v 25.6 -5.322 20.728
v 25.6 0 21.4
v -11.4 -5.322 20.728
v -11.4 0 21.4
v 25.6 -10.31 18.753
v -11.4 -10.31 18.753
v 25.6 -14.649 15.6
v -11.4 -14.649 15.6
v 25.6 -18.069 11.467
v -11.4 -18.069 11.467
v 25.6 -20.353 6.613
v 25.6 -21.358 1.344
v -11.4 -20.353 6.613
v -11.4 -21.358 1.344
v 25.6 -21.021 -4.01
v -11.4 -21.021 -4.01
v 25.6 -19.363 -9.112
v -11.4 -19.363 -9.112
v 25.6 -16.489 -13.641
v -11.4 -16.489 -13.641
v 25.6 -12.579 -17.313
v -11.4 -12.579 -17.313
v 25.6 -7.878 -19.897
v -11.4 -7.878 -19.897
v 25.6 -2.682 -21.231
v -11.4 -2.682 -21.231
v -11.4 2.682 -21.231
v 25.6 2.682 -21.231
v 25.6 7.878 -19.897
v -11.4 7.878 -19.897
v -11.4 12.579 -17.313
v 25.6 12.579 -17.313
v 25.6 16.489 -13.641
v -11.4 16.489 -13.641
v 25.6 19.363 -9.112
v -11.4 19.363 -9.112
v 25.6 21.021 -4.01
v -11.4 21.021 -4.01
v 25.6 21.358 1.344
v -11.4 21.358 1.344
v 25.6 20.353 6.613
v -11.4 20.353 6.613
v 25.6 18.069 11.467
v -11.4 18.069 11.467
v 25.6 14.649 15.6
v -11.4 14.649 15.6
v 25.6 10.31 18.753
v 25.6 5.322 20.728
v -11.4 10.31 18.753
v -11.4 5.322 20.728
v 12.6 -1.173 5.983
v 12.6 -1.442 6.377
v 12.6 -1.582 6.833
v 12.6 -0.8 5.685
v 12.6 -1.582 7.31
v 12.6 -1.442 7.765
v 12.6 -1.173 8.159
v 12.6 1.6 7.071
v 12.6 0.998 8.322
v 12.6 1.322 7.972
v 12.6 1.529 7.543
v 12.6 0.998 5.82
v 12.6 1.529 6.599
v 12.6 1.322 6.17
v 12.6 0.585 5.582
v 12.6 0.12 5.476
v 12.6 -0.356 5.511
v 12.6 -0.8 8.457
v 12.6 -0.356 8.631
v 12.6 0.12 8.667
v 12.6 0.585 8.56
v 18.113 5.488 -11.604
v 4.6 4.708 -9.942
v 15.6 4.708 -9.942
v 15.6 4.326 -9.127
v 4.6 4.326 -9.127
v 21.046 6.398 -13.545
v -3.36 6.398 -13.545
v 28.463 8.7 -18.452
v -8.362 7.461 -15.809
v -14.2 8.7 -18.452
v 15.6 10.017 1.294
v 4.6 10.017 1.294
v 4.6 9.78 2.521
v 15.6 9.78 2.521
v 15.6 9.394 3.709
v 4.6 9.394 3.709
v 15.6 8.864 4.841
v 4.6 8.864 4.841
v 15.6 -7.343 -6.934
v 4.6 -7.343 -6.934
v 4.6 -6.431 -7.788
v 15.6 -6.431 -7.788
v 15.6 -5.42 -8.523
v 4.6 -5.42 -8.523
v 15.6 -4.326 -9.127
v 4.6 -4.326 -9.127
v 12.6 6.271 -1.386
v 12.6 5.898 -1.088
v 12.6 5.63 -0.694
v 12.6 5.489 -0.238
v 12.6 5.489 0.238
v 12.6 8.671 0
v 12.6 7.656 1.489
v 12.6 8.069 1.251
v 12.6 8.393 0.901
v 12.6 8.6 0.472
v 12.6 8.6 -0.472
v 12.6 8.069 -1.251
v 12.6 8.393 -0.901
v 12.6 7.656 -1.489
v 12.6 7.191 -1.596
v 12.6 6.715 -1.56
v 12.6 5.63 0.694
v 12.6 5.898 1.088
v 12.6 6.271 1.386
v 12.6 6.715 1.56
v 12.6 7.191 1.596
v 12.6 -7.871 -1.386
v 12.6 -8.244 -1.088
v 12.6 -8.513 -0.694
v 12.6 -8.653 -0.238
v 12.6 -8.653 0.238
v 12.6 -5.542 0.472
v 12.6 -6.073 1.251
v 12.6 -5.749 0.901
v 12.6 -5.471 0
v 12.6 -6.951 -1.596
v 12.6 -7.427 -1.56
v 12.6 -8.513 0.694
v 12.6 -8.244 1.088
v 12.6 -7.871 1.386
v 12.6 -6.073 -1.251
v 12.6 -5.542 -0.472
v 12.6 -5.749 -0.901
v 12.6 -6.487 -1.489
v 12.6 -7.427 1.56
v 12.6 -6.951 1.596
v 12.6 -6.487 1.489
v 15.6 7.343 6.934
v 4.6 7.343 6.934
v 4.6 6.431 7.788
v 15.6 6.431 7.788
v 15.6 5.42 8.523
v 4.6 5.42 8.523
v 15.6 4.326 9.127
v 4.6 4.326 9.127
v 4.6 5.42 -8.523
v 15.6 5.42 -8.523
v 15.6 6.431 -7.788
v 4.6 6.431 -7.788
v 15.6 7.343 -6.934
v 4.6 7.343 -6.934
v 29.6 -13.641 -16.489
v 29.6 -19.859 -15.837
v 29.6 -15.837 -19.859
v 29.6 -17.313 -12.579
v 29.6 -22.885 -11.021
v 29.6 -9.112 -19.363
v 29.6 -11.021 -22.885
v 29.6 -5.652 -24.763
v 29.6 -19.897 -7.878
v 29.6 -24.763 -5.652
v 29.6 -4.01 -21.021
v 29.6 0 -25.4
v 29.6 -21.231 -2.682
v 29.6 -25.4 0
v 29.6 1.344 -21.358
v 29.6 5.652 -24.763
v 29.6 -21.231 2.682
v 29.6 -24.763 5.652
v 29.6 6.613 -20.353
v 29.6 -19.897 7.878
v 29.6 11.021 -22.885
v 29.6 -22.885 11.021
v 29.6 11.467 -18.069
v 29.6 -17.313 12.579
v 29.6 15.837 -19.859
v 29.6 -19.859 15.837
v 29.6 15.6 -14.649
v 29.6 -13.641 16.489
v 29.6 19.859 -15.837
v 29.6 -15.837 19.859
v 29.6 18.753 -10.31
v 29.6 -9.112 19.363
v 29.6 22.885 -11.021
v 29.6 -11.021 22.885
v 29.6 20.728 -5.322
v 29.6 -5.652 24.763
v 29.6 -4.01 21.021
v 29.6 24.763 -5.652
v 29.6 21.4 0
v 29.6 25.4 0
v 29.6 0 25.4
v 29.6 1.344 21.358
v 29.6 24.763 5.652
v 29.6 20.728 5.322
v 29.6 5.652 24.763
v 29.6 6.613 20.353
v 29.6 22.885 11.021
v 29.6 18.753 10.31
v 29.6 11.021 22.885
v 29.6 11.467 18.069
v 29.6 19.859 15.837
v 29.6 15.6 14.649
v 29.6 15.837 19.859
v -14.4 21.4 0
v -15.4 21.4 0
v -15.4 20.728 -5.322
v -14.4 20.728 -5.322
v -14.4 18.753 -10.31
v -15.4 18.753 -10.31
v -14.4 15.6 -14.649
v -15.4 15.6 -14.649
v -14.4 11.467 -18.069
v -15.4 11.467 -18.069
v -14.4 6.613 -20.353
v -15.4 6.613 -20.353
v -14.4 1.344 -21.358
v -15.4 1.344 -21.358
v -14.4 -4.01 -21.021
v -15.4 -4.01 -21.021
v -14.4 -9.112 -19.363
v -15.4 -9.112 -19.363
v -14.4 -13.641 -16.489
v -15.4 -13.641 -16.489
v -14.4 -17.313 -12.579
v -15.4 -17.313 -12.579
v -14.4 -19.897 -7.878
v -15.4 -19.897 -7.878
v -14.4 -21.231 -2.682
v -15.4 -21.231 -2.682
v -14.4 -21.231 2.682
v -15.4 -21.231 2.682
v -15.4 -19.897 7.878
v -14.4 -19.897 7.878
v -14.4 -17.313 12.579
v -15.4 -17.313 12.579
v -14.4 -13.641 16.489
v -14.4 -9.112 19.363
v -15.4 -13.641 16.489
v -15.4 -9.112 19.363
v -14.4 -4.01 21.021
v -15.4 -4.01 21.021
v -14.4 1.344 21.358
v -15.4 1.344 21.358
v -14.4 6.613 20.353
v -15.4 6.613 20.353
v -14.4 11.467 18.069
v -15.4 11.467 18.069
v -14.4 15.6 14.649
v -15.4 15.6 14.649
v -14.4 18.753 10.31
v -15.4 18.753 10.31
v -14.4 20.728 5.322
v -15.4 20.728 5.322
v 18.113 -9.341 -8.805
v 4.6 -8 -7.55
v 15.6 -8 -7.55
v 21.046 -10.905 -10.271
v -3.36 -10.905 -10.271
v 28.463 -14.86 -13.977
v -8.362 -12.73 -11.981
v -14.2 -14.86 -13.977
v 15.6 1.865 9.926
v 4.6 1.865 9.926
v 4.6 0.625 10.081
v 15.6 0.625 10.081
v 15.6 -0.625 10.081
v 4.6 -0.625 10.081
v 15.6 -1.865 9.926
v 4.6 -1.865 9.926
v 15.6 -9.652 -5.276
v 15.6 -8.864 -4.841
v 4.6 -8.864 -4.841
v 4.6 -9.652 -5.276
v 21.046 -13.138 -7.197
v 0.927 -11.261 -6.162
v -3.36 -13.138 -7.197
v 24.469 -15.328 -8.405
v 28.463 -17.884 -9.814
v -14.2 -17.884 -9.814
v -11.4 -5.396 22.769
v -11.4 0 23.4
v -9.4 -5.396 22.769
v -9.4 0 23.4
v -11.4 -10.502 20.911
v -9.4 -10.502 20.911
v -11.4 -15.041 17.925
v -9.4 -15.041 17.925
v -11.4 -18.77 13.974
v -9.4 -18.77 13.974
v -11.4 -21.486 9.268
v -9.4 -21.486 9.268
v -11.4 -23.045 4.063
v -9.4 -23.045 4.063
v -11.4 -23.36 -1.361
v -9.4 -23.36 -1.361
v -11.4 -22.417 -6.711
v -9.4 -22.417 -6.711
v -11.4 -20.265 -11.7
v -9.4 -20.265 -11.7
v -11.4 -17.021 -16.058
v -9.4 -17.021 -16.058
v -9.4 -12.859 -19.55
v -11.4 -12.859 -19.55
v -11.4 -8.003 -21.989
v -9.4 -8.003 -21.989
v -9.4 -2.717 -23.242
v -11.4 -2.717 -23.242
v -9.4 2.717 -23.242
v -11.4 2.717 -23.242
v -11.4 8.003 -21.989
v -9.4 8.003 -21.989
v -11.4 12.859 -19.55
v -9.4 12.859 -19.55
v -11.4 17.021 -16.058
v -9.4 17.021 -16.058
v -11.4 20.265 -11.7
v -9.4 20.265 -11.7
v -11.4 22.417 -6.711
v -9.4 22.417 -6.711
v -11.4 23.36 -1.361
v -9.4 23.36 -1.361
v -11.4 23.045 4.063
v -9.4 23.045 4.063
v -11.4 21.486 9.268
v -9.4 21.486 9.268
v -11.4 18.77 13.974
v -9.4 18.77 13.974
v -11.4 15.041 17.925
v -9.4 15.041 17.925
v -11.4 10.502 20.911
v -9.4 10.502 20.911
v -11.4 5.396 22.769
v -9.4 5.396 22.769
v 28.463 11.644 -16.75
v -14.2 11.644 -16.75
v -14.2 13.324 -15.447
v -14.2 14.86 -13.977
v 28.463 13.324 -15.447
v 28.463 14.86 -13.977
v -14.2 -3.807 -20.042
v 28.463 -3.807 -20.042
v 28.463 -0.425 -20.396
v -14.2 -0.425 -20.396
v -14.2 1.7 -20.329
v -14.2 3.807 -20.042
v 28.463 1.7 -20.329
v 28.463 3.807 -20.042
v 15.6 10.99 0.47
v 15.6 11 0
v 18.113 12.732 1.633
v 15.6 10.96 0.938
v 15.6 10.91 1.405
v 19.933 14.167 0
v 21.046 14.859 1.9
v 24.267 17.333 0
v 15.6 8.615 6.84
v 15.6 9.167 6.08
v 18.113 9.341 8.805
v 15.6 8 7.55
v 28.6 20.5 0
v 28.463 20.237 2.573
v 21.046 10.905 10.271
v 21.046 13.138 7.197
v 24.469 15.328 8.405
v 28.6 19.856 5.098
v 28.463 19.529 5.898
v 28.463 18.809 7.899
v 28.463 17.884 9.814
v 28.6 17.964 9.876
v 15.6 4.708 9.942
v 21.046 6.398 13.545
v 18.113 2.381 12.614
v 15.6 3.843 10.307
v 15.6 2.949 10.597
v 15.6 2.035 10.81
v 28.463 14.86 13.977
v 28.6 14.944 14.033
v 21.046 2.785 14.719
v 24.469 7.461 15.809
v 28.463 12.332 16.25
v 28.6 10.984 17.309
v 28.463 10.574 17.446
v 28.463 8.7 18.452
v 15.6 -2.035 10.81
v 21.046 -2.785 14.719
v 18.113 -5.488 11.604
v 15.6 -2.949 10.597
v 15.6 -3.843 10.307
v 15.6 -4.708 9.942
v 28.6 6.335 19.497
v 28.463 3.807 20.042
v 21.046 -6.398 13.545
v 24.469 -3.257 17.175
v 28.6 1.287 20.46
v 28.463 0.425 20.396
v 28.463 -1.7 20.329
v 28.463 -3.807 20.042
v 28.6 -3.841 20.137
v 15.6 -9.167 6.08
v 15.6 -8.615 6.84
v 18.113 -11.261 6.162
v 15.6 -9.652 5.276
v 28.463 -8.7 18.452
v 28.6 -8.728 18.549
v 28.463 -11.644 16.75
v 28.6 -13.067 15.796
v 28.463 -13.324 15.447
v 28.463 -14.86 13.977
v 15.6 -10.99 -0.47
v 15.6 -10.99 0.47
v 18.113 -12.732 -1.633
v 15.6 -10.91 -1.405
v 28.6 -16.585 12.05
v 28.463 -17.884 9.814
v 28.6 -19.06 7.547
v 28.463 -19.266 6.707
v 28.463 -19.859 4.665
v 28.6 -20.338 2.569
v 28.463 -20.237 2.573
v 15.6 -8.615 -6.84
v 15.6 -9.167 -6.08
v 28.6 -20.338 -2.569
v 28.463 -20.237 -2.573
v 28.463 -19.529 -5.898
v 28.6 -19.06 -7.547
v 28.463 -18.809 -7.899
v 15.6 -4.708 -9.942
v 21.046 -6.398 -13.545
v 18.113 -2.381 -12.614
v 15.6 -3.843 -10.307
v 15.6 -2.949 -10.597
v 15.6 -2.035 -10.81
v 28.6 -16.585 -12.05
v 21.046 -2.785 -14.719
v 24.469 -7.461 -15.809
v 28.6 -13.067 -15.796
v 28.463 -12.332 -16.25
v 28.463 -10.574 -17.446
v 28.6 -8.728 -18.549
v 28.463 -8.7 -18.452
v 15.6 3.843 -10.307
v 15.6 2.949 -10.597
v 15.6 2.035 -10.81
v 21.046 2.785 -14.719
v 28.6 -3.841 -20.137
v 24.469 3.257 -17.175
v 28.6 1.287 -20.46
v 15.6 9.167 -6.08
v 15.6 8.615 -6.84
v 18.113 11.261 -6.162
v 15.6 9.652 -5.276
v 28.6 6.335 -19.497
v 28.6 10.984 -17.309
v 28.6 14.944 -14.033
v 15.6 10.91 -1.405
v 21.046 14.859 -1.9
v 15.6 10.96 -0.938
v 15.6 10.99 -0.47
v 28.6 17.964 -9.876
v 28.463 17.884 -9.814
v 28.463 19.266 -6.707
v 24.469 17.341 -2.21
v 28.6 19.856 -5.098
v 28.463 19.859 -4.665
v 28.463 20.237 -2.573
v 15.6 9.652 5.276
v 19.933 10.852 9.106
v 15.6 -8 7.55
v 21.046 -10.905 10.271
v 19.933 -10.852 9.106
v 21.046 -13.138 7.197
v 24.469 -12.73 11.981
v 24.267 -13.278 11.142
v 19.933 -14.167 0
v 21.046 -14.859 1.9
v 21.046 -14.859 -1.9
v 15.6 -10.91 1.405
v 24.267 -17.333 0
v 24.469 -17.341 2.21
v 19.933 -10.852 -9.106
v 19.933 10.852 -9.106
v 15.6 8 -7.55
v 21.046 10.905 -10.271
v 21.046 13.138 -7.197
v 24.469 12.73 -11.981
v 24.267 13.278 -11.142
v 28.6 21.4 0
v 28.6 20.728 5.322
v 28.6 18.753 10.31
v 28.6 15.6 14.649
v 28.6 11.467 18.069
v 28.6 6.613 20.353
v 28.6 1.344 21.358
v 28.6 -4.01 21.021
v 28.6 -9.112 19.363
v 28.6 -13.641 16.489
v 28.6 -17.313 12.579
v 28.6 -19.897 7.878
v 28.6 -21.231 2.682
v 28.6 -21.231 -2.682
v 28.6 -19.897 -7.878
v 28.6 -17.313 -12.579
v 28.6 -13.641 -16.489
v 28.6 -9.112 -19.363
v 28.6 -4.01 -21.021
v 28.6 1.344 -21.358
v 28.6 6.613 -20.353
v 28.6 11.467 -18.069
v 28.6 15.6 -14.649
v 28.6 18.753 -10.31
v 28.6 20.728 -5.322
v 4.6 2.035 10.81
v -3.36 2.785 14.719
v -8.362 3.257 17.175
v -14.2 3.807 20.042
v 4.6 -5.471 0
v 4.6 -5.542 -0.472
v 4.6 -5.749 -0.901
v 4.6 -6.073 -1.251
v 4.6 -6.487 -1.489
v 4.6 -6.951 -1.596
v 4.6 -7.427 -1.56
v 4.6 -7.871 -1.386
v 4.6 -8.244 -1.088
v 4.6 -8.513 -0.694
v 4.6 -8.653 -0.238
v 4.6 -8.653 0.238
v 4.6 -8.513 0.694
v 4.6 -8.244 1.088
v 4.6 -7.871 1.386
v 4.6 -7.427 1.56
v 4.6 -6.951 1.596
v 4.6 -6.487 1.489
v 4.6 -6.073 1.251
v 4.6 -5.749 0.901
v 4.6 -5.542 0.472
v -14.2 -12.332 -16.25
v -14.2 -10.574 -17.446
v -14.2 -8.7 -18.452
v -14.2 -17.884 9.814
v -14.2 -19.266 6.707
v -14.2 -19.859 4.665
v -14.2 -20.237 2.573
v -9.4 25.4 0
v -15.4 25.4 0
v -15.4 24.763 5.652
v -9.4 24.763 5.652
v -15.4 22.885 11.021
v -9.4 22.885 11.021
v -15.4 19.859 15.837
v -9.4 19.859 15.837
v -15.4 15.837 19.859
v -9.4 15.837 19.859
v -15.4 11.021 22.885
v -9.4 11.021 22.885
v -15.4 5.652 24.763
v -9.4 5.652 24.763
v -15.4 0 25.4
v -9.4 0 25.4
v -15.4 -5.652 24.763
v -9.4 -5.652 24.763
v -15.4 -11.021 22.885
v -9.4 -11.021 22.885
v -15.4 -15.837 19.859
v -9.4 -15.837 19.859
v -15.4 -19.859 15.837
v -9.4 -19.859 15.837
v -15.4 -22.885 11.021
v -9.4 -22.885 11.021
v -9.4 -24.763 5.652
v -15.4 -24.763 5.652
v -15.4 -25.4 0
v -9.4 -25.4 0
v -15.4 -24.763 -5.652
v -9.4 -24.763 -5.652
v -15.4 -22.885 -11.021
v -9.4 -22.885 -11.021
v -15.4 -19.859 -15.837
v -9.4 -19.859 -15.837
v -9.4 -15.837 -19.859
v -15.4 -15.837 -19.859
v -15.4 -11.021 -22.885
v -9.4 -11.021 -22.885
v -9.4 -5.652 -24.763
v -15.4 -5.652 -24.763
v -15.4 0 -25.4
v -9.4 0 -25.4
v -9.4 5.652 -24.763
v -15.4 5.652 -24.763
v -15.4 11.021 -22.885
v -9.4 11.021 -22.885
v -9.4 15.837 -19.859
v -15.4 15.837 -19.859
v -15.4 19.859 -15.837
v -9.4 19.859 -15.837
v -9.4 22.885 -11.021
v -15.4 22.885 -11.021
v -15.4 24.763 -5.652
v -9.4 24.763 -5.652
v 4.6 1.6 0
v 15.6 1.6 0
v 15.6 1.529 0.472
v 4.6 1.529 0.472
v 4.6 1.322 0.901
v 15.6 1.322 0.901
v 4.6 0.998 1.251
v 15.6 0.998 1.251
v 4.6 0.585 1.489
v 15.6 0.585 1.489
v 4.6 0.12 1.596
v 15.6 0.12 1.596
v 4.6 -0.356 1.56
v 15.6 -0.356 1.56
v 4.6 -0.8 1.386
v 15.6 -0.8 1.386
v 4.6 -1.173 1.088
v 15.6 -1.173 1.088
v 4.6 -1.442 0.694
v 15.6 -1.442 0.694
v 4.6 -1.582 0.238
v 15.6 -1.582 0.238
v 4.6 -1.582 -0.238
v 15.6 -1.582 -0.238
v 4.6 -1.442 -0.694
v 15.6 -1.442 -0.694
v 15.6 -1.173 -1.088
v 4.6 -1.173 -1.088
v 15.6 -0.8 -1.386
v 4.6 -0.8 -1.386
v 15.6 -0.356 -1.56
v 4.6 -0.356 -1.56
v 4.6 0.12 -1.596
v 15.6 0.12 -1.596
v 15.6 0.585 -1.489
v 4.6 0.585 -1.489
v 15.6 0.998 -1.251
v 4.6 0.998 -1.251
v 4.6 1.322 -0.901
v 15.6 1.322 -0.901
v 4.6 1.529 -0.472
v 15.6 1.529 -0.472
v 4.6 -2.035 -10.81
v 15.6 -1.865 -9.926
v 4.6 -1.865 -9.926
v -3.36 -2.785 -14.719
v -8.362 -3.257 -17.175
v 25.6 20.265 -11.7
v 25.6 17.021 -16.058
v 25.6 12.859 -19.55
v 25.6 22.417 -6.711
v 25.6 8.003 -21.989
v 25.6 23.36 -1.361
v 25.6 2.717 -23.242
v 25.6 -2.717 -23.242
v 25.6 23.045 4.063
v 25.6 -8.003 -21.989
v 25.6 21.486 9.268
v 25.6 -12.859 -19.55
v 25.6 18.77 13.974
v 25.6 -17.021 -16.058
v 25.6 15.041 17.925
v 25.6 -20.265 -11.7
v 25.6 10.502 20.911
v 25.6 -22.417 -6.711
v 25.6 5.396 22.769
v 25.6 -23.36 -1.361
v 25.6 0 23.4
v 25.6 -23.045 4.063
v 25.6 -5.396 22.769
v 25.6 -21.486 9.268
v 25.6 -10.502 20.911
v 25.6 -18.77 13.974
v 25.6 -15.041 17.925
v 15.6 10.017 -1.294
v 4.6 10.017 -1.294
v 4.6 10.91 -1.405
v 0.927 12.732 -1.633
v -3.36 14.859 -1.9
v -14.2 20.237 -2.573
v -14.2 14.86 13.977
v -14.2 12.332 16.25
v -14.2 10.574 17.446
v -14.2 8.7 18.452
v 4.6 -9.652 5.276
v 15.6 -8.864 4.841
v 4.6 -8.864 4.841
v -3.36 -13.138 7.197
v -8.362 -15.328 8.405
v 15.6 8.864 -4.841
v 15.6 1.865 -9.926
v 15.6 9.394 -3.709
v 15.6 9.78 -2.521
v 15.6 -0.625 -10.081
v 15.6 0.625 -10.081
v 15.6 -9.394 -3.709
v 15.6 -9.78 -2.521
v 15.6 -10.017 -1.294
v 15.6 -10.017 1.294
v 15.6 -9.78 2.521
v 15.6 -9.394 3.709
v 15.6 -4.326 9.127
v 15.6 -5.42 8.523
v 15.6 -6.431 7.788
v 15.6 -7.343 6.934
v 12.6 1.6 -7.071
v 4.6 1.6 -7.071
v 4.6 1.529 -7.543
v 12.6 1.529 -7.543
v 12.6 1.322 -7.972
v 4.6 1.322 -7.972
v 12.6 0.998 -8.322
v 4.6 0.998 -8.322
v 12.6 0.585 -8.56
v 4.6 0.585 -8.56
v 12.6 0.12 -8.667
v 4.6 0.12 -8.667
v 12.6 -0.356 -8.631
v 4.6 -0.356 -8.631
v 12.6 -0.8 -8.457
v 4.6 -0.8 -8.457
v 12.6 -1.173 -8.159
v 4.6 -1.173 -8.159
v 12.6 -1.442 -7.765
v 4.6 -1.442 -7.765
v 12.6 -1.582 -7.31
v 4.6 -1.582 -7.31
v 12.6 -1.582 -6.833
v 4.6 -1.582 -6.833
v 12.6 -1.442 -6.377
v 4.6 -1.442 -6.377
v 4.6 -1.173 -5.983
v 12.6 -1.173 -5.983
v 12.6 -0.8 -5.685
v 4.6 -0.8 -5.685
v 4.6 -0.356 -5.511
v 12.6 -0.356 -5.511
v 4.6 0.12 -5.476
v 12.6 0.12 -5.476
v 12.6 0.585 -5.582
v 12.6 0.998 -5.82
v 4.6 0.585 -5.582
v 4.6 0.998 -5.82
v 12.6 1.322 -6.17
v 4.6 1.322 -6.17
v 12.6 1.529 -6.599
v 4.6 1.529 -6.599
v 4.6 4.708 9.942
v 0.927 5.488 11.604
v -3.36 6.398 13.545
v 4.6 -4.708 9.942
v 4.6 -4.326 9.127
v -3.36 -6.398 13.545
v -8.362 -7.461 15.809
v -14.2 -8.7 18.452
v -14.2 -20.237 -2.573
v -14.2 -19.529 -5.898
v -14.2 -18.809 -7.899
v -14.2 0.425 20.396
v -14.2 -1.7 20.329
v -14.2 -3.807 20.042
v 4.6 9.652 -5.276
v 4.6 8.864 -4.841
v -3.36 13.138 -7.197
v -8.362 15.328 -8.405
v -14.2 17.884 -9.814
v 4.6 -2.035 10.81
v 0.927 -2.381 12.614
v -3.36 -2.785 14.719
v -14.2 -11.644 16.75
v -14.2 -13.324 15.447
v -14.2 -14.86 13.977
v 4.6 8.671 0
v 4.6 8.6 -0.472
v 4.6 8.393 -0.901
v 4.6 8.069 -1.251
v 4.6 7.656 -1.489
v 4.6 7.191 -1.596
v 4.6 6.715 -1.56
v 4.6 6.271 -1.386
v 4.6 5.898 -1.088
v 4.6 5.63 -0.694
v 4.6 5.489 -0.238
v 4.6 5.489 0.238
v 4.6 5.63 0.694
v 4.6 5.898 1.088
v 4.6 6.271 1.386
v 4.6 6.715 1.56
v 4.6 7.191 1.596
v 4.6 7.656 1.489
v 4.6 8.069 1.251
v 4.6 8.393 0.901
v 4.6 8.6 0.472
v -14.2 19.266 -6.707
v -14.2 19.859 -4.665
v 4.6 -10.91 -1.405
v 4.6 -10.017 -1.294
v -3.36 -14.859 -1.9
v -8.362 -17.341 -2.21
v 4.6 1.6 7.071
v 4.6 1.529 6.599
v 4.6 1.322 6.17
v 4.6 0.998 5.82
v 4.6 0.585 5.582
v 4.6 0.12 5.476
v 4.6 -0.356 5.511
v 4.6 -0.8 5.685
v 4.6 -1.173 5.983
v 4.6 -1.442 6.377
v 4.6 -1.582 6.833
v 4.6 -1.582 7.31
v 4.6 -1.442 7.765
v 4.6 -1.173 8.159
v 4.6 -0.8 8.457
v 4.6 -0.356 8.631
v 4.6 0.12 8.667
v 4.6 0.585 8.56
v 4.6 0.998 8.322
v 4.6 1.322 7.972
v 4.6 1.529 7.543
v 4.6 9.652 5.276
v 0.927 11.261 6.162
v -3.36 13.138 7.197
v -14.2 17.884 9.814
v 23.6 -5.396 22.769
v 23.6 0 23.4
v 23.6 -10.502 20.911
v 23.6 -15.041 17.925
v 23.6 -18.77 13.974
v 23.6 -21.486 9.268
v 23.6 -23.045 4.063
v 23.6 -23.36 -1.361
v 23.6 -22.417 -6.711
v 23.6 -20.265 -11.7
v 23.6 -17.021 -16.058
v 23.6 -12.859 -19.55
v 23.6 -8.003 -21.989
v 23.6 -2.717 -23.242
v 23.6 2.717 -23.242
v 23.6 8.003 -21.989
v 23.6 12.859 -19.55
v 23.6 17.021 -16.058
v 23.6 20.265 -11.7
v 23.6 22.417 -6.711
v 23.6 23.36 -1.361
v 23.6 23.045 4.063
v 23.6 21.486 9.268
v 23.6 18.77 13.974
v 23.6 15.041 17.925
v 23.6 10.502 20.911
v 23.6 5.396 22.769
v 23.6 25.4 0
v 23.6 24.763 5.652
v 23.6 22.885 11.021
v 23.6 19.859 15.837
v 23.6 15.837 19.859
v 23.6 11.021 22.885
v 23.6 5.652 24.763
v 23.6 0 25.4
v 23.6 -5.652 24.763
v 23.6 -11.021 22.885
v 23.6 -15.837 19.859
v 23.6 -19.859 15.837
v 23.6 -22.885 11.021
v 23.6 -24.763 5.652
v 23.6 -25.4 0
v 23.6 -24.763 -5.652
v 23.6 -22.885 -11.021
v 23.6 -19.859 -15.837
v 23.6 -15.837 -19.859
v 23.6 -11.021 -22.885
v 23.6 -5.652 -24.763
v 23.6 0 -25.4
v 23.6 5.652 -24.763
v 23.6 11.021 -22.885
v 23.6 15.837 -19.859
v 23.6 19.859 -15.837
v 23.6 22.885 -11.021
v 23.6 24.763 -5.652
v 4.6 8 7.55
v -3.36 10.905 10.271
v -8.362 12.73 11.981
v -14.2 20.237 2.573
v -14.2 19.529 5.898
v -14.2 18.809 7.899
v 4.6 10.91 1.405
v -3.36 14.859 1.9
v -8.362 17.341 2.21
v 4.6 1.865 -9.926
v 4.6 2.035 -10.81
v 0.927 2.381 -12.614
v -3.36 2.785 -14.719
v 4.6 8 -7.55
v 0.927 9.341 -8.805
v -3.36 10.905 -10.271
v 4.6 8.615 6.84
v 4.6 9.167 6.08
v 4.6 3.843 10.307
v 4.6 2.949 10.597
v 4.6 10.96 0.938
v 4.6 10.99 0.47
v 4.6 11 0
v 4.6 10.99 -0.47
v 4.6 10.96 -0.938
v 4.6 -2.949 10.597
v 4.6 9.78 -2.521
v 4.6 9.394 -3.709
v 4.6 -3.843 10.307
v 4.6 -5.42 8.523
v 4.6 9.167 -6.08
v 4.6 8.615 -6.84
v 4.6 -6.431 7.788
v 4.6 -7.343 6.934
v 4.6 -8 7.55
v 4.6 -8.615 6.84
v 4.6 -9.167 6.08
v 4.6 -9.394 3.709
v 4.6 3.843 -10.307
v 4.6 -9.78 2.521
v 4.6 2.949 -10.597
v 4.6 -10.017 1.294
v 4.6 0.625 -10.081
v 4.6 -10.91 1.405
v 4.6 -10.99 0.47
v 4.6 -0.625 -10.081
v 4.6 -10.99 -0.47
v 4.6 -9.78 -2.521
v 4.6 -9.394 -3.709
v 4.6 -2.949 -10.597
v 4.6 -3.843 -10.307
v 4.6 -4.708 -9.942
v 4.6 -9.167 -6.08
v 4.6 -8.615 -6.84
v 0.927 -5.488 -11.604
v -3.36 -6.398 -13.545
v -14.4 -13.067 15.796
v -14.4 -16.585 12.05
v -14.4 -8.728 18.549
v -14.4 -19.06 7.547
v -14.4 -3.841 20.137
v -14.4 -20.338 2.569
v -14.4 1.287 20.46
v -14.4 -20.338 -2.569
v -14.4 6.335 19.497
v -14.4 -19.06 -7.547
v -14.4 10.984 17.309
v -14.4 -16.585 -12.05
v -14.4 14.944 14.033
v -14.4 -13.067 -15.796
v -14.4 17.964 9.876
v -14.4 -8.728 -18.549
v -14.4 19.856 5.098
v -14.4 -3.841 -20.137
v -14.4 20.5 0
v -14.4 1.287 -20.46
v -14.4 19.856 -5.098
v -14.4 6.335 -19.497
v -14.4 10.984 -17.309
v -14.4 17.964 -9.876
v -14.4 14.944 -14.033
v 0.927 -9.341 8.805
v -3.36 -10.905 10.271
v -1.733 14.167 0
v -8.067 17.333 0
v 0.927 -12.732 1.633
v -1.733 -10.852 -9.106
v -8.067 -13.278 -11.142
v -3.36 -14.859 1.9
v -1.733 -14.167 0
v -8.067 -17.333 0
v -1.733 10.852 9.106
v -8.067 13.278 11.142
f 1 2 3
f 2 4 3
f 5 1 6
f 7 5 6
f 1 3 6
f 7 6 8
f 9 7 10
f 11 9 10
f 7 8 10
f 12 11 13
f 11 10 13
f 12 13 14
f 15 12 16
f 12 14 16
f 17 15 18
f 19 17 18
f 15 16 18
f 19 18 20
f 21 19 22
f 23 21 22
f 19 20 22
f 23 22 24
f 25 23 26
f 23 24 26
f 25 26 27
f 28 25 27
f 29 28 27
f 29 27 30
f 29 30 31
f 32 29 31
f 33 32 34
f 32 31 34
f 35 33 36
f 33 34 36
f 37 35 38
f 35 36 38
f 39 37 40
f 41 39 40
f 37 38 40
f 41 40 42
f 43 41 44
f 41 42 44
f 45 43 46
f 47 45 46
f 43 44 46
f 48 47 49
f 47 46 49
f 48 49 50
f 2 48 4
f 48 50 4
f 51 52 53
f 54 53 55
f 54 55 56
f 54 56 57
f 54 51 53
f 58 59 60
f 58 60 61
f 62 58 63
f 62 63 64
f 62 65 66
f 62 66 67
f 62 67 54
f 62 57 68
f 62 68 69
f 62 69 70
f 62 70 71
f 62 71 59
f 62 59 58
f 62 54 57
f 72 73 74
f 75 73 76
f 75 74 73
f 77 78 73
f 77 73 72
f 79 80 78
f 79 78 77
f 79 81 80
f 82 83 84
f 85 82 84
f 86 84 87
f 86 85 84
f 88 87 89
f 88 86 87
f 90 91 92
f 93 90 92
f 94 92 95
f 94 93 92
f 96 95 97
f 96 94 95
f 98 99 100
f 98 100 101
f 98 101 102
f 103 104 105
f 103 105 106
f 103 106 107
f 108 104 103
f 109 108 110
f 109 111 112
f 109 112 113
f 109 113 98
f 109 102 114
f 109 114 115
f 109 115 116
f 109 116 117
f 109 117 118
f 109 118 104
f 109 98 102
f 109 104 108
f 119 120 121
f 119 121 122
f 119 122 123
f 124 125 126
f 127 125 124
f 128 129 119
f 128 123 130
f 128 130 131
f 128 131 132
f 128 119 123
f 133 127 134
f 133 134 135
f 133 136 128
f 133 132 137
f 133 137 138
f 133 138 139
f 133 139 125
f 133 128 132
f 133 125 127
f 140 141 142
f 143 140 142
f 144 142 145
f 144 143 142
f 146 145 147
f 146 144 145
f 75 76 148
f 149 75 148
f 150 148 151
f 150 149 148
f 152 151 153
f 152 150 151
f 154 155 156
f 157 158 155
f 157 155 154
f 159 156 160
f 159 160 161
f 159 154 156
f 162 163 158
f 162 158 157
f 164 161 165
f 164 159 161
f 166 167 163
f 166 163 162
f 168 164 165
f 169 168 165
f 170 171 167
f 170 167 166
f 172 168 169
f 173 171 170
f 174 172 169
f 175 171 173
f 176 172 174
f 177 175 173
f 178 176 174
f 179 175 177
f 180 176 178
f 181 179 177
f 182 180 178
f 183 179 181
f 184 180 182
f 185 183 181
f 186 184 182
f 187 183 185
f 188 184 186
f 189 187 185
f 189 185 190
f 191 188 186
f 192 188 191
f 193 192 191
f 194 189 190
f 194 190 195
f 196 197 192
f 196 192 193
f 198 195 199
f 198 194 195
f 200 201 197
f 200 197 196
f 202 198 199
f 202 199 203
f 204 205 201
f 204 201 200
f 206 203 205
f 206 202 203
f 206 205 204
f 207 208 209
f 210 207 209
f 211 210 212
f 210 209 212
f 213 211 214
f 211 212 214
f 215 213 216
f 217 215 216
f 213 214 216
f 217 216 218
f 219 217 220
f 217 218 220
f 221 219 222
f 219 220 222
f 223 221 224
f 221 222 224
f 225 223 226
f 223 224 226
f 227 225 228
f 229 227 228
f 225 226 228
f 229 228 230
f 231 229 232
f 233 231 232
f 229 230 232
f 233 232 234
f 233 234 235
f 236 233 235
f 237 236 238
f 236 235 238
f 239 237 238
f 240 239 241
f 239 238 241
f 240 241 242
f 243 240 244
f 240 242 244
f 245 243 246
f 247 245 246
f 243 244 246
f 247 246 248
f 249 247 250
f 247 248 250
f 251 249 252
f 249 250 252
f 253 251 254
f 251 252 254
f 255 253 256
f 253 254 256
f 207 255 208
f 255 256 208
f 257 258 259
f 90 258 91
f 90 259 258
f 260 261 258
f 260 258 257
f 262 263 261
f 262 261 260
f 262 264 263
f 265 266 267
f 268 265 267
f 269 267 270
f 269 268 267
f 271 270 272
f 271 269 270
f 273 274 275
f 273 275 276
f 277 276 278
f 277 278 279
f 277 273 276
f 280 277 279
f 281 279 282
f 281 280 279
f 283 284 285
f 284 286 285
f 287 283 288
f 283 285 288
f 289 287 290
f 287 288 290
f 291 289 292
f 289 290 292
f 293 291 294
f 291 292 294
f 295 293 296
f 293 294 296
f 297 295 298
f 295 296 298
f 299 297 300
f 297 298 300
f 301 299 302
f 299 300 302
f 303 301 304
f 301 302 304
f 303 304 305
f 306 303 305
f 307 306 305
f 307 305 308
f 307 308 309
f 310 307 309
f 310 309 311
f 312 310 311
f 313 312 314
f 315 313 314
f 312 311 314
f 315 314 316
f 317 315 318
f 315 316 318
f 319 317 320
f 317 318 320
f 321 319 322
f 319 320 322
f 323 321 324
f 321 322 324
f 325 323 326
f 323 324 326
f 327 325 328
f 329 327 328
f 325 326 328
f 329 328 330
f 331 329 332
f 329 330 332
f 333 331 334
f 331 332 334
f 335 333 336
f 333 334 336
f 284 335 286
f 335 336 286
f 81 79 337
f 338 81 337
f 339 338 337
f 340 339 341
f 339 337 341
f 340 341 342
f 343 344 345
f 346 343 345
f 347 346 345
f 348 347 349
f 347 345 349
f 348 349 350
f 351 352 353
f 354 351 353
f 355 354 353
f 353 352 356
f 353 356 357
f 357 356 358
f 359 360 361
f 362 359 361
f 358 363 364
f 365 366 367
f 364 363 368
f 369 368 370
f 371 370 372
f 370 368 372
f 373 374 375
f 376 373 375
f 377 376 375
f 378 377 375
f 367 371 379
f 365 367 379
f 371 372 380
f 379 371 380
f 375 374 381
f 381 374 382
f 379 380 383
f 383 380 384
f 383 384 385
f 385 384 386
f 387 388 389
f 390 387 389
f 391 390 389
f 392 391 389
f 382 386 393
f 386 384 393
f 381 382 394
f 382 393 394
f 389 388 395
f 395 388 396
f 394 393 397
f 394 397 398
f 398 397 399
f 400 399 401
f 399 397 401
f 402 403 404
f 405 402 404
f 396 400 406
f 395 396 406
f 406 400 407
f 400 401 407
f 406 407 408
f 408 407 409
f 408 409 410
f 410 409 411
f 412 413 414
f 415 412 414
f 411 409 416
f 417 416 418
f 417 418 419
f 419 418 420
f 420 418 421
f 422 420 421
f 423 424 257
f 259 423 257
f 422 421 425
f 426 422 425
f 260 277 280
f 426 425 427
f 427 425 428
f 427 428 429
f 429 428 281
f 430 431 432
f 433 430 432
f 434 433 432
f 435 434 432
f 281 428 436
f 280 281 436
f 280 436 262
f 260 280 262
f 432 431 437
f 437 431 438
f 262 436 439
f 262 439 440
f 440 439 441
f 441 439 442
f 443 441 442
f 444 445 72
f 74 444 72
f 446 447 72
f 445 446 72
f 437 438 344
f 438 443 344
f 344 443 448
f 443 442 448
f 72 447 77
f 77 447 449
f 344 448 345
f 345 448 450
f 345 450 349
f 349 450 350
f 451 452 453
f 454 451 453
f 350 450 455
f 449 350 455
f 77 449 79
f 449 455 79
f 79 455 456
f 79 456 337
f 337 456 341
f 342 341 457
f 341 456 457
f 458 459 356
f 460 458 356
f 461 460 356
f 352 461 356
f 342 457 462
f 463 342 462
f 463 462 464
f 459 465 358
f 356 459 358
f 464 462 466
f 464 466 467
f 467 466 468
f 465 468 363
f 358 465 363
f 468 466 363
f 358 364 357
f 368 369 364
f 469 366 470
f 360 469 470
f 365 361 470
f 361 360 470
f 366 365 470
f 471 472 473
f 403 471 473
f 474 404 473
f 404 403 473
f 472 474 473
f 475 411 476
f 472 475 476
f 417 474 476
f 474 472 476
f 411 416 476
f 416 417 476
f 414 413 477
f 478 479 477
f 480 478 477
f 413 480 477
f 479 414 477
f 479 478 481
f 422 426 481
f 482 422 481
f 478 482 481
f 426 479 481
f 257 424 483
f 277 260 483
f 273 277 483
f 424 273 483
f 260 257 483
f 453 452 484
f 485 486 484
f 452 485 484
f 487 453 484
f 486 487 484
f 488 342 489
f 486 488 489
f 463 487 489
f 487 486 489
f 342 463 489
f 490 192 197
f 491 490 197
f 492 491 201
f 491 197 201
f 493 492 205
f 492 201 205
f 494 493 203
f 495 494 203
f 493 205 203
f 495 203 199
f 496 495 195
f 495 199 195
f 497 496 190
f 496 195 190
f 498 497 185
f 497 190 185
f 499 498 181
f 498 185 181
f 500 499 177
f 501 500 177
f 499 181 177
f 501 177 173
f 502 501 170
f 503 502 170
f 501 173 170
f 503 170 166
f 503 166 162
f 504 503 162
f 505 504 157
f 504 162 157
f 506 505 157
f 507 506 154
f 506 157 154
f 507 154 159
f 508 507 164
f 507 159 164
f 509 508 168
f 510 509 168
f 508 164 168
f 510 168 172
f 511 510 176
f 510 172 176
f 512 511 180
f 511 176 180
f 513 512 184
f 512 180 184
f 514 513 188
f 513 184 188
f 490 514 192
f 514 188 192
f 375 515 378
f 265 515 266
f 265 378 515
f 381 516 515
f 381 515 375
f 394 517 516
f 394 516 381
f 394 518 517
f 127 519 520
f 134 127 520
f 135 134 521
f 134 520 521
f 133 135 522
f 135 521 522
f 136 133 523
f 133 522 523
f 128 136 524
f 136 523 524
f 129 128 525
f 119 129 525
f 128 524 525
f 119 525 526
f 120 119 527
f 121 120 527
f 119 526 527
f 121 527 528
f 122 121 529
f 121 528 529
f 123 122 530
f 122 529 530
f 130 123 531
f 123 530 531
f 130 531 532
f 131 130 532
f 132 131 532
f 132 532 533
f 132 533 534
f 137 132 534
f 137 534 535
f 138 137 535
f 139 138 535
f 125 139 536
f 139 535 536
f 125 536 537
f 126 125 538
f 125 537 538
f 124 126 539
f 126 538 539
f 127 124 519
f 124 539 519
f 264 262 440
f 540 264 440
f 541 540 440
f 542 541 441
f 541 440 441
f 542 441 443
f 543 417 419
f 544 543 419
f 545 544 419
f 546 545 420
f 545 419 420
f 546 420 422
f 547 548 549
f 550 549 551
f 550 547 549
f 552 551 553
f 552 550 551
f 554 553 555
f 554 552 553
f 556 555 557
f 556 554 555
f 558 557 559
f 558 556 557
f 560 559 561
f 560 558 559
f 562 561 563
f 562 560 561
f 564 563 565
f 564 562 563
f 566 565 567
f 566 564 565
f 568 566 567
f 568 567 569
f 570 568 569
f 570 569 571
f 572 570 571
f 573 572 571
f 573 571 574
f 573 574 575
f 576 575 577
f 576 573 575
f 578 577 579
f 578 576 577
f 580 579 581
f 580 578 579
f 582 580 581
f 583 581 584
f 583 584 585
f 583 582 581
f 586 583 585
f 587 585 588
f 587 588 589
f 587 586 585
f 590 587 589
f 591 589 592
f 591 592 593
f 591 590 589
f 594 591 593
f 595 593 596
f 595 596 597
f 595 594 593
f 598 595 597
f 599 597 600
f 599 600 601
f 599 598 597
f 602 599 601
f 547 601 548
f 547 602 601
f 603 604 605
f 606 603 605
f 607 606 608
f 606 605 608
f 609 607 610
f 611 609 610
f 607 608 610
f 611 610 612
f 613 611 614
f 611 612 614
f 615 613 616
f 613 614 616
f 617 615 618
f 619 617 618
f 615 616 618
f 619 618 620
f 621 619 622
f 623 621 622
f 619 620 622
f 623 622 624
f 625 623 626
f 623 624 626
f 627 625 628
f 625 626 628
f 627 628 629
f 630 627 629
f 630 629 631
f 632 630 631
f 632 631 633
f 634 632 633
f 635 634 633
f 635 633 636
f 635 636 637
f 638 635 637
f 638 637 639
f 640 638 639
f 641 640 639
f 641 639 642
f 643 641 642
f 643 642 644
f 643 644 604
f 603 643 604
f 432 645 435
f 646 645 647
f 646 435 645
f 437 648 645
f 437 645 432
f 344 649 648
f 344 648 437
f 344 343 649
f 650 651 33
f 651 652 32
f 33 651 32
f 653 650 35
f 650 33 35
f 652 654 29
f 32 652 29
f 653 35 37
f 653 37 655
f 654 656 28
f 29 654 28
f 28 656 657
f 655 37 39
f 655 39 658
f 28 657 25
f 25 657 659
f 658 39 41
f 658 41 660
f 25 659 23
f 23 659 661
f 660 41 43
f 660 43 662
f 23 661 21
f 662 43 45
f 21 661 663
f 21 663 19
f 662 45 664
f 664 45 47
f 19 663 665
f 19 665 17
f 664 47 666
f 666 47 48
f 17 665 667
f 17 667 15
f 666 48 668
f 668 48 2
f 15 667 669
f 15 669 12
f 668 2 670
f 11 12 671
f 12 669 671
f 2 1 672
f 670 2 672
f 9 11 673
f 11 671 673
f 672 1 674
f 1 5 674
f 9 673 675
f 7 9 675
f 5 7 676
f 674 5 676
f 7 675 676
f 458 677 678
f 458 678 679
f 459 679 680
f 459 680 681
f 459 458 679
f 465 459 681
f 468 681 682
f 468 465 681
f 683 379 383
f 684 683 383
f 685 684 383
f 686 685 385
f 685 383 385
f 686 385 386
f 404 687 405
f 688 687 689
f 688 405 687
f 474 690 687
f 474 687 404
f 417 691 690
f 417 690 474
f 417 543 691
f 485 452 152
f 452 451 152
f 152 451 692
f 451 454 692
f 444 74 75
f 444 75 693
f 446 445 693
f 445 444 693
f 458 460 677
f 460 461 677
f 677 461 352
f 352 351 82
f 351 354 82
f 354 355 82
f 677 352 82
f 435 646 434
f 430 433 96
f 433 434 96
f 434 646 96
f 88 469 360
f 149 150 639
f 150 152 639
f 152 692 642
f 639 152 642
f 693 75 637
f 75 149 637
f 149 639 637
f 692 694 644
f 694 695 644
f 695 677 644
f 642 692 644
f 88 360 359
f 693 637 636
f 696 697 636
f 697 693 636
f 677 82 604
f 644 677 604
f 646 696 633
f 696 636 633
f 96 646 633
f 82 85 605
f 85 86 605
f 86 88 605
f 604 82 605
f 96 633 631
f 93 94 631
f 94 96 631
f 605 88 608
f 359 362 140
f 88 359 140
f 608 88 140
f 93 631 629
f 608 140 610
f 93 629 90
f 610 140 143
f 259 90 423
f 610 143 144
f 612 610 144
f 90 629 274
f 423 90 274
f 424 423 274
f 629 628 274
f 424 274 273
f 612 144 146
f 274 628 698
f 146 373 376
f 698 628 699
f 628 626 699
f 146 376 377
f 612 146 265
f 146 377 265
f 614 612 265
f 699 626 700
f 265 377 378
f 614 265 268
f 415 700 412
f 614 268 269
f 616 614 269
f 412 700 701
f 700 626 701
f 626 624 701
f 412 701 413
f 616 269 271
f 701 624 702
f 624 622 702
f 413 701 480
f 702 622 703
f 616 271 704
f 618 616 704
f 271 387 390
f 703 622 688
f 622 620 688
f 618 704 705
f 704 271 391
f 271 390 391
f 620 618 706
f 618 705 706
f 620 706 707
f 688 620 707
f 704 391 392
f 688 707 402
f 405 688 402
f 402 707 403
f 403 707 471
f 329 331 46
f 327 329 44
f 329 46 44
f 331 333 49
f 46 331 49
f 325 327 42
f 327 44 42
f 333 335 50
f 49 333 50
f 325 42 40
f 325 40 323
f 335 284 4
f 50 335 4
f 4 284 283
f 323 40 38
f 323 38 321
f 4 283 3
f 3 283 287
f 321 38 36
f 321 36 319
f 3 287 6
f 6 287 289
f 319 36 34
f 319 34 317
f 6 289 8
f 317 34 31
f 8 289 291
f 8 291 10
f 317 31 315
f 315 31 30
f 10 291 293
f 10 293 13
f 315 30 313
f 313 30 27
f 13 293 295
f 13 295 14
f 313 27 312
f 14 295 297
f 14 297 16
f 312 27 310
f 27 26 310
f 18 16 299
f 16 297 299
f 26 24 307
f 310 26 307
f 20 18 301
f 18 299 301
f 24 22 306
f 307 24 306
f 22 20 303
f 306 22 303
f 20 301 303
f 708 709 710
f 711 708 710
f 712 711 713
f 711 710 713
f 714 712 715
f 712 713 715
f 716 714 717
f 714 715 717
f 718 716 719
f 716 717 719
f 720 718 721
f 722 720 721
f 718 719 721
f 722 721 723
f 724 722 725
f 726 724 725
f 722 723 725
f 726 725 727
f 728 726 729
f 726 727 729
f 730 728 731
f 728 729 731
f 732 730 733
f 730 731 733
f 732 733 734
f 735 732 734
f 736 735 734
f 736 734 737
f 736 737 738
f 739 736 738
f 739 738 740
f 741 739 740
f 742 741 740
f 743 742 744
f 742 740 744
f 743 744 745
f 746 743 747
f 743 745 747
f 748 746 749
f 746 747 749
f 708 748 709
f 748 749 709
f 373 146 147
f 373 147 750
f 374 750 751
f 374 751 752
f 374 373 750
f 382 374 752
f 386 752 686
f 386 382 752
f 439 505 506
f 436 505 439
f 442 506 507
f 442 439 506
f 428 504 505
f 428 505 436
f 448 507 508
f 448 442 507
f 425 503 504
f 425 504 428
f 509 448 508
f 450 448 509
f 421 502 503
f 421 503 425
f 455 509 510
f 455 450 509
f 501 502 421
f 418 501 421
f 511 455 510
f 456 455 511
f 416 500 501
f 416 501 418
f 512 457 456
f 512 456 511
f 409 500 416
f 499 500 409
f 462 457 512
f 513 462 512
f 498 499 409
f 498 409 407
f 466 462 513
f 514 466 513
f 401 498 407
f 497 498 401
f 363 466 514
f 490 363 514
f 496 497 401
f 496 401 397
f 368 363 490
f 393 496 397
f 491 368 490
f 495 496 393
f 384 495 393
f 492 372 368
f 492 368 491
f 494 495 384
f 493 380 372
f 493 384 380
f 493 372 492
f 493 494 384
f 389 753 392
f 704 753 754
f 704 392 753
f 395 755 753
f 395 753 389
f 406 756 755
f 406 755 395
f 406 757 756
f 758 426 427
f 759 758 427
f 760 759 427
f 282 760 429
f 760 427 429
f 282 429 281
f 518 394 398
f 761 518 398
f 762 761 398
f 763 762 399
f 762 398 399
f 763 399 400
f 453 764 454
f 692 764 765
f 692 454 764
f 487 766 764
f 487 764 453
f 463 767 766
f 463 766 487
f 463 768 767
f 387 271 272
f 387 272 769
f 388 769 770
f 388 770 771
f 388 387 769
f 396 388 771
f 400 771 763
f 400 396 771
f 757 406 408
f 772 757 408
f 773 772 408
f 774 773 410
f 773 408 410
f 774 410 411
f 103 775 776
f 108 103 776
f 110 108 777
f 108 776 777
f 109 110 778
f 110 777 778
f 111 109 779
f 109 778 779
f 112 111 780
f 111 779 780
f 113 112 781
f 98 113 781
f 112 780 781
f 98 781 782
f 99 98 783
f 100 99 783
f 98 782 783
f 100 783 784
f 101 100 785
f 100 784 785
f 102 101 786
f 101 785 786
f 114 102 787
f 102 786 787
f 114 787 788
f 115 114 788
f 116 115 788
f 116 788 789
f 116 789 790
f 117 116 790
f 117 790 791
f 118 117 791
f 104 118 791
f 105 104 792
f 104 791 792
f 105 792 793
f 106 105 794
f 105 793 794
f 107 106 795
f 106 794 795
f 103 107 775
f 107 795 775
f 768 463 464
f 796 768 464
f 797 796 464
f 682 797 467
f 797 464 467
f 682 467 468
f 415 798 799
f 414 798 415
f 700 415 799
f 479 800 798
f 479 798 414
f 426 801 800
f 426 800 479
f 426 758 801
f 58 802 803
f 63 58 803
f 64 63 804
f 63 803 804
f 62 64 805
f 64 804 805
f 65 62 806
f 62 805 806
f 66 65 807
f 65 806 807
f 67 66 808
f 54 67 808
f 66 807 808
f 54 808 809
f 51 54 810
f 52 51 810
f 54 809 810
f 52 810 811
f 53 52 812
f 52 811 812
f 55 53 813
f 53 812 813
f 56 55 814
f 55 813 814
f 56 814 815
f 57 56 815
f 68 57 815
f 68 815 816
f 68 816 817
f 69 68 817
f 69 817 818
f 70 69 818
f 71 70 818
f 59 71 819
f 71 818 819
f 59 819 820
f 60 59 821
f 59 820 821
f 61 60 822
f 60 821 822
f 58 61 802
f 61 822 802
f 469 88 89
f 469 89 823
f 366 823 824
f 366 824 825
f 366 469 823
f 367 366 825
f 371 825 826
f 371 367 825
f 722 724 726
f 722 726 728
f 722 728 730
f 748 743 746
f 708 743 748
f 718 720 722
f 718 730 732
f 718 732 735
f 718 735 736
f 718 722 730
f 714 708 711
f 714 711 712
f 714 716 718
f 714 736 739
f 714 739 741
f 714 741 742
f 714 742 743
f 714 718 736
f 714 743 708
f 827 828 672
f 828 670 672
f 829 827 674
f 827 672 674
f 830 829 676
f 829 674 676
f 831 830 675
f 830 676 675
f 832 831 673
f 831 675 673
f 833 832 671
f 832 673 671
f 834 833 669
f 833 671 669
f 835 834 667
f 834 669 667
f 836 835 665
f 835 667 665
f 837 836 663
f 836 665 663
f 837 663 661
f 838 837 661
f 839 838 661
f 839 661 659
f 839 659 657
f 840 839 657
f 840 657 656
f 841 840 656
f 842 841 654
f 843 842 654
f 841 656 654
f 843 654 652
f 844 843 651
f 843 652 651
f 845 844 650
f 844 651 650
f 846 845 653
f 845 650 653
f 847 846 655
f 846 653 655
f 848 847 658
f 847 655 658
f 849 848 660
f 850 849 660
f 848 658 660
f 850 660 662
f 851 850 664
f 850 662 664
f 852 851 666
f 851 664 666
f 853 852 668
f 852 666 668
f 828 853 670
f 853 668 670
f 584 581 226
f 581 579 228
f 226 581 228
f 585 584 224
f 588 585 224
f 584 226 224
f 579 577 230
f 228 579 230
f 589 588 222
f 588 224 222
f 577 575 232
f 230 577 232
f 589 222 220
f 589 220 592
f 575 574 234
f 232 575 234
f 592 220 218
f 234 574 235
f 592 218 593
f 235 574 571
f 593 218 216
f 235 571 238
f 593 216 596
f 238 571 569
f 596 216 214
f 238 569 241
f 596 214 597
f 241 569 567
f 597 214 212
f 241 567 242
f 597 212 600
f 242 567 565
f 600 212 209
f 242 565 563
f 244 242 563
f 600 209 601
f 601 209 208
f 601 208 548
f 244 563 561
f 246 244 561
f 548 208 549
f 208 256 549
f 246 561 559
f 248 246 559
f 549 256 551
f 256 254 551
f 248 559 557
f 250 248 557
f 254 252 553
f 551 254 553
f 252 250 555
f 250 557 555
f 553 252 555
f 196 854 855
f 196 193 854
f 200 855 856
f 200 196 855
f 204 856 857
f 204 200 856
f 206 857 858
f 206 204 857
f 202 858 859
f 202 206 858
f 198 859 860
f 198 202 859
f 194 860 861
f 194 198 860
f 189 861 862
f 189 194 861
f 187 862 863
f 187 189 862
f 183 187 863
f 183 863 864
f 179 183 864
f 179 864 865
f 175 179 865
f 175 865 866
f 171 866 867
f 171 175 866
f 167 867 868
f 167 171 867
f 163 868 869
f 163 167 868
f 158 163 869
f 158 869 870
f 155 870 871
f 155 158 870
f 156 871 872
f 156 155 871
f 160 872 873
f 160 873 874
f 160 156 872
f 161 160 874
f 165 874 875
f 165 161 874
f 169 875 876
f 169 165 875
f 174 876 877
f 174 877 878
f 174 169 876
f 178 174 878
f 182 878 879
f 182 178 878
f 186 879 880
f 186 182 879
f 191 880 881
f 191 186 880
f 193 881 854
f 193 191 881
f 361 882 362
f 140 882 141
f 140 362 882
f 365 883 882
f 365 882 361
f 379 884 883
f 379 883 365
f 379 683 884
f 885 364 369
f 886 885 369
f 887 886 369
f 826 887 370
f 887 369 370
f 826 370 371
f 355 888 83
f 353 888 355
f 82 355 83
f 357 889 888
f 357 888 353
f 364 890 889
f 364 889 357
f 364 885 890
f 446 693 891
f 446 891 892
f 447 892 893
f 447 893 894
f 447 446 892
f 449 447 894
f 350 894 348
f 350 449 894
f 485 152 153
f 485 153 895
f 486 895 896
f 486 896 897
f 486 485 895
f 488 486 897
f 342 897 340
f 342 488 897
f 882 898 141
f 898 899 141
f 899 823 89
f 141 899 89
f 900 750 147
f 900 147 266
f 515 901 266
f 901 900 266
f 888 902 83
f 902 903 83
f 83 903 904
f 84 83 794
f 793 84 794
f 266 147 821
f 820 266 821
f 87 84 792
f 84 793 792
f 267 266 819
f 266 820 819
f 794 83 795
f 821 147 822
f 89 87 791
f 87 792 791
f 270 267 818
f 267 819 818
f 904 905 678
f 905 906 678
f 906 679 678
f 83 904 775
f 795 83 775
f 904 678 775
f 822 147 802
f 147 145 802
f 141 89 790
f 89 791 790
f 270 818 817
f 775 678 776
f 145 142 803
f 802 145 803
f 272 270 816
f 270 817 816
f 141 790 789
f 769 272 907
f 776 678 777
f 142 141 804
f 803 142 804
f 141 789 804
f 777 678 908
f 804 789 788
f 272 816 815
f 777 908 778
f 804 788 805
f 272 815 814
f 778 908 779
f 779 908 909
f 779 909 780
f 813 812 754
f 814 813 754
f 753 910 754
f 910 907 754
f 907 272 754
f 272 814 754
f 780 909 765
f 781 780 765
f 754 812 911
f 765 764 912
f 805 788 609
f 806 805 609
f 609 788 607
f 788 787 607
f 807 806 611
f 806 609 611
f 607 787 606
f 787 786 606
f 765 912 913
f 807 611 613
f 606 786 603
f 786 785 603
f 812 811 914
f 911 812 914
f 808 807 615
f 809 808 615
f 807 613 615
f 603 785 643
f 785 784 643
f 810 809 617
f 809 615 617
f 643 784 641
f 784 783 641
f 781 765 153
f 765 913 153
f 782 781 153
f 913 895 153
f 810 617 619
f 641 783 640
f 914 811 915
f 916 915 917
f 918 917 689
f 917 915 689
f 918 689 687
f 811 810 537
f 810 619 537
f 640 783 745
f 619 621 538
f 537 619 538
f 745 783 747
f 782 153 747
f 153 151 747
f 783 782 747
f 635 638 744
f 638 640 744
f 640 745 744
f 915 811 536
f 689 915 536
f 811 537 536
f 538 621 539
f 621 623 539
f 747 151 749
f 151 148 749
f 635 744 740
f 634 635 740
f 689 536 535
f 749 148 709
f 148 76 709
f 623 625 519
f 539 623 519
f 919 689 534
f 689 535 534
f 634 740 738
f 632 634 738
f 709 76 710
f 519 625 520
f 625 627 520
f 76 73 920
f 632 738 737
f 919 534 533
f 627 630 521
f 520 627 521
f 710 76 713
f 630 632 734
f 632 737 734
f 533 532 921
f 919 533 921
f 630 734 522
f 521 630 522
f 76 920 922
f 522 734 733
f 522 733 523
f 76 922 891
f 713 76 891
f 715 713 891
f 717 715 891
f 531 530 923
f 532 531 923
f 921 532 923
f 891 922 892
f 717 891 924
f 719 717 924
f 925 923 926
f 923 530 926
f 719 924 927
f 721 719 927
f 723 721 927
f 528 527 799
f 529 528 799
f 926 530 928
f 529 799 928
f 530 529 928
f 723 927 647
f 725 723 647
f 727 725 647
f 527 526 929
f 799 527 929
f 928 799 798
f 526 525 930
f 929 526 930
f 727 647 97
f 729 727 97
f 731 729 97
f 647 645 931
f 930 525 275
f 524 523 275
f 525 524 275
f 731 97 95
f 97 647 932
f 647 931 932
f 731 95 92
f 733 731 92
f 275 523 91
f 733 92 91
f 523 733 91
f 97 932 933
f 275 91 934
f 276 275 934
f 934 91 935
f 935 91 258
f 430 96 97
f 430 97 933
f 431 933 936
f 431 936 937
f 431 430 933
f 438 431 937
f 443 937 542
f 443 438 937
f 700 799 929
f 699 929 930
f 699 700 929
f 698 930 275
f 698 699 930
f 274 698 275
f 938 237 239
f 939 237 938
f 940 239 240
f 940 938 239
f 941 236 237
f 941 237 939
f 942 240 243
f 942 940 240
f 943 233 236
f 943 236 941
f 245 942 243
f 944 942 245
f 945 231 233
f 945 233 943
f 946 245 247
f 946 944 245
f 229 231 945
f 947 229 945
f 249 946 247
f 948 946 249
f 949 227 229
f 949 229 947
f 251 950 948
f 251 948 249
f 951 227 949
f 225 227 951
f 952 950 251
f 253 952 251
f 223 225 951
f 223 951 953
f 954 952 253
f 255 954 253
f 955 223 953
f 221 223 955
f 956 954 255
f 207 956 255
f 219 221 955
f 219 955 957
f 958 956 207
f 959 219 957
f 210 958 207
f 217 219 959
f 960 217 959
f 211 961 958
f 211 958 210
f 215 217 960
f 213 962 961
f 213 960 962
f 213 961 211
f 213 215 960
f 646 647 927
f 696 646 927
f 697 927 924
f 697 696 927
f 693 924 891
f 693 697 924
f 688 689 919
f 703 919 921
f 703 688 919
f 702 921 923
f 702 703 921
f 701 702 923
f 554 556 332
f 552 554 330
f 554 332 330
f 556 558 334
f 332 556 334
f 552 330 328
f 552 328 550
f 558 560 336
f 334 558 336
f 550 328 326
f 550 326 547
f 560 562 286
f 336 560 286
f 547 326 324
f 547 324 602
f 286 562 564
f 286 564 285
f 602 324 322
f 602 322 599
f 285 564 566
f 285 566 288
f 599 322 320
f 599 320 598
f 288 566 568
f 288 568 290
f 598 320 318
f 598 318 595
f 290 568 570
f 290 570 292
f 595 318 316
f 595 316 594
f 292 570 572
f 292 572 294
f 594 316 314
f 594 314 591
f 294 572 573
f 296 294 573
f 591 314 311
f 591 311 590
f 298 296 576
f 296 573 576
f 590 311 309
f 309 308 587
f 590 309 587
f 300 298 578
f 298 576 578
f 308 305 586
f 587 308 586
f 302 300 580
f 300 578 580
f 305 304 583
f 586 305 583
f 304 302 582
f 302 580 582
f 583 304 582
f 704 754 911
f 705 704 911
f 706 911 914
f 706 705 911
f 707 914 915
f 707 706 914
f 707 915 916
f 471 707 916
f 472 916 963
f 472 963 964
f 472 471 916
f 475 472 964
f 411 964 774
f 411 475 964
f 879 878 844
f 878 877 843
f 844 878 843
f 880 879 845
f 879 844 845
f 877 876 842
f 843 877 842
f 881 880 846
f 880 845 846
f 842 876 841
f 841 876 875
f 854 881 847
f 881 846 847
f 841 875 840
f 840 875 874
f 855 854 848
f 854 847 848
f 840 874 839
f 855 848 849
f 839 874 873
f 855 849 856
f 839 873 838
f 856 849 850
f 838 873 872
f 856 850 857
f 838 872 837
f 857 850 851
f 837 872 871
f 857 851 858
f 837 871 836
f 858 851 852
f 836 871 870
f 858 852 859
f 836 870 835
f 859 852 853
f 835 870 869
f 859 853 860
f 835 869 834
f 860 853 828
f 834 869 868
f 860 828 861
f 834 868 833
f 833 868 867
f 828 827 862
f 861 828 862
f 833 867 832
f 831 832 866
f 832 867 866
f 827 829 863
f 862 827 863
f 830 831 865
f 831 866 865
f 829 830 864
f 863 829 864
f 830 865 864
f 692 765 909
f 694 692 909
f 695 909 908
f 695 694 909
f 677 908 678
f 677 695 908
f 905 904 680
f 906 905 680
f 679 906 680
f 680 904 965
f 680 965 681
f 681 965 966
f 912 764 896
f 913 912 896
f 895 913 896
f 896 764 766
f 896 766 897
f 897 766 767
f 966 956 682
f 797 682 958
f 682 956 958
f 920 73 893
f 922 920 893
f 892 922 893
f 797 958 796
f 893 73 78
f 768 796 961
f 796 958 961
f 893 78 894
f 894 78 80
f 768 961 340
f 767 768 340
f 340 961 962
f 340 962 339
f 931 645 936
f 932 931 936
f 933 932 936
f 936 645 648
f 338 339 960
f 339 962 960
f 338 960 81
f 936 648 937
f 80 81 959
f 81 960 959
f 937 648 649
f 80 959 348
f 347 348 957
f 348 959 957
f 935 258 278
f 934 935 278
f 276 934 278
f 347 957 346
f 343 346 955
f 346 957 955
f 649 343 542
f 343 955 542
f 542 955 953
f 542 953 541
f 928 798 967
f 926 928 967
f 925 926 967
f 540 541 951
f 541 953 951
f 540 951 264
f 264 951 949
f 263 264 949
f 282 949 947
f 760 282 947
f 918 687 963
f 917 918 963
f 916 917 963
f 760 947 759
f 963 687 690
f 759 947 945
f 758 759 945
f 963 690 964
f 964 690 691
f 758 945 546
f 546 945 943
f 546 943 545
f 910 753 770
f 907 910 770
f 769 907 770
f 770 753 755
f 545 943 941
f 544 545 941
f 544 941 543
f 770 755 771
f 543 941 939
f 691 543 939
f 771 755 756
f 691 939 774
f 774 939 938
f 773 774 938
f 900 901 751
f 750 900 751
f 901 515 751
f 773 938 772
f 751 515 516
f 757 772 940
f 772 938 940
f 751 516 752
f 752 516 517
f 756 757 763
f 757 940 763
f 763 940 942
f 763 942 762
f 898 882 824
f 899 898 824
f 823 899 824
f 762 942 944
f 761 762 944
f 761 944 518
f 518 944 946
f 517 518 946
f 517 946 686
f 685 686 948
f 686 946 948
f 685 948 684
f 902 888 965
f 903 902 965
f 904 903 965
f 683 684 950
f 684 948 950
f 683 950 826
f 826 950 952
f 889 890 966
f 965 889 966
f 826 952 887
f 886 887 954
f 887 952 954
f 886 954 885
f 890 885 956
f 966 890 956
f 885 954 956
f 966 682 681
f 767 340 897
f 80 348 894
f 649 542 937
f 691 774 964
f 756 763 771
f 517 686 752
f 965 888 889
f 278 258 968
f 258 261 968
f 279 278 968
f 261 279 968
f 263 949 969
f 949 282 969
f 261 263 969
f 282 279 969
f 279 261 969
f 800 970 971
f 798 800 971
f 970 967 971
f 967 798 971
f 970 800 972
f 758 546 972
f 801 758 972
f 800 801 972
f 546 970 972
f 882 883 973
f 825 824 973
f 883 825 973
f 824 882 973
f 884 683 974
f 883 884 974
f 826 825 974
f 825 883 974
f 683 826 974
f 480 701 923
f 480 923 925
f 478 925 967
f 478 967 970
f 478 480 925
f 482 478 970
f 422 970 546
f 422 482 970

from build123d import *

# Parameters (mm, degrees)
SKETCH027_R        = 25.4
PAD009_DEPTH       = 22.5
POCKET015_DEPTH    = 214.544859
POLARPATTERN_COUNT = 10
SKETCH029_R        = 1.6
POCKET016_DEPTH    = 45.001
SKETCH030_R        = 21.4
POCKET017_DEPTH    = 1
SKETCH_R           = 21.4
POCKET_DEPTH       = 1
SKETCH031_R        = 10.1
POCKET018_DEPTH    = 19
SKETCH069_R        = 1.6
POCKET040_DEPTH    = 8
SKETCH035_R        = 10.1
POCKET020_DEPTH    = 13


with BuildPart() as part:
    # Sketch027 → Pad009 (new body, symmetric)
    with BuildSketch(Plane.YZ):
        Circle(SKETCH027_R)
    extrude(amount=PAD009_DEPTH, both=True)

    # Sketch028 (on Face3 of Pad009) → Pocket015 (cut, through all)
    with BuildSketch(Plane.YZ.offset(22.5)):
        with BuildLine():
            ThreePointArc((1.865103, 9.926298), (0, 10.1), (-1.865103, 9.926298))
            Line((-1.865103, 9.926298), (-3.806742, 20.041674))
            ThreePointArc((3.806742, 20.041674), (0, 20.4), (-3.806742, 20.041674))
            Line((3.806742, 20.041674), (1.865103, 9.926298))
        make_face()
    pocket015 = extrude(amount=-POCKET015_DEPTH, mode=Mode.SUBTRACT)

    # PolarPattern: Pocket015 ×10 about axis
    polarpattern_axis = Axis((22.5, 0, 0), (1, 0, 0))
    for i in range(1, POLARPATTERN_COUNT):
        add(pocket015.rotate(polarpattern_axis, i * 360 / POLARPATTERN_COUNT), mode=Mode.SUBTRACT)

    # Sketch033 → Groove (revolve, cut)
    with BuildSketch(Plane.XZ):
        Polygon((-16.5, 25.4), (16.5, 25.4), (16.5, 23.4), (18.5, 23.4), (18.5, 21.4), (-18.5, 21.4), (-18.5, 23.4), (-16.5, 23.4), align=None)
    revolve(axis=Axis((0, 0, 0), (1, 0, 0)), mode=Mode.SUBTRACT)

    # Sketch029 (on Face3 of PolarPattern) → Pocket016 (cut, through all)
    with BuildSketch(Plane.YZ.offset(22.5)):
        Circle(SKETCH029_R)
    extrude(amount=-POCKET016_DEPTH, mode=Mode.SUBTRACT)

    # Sketch030 (on Face2 of Pocket016) → Pocket017 (cut)
    with BuildSketch(Plane(origin=(-22.5, 0, 0), x_dir=(0, 1, 0), z_dir=(-1, 0, 0))):
        Circle(SKETCH030_R)
    extrude(amount=-POCKET017_DEPTH, mode=Mode.SUBTRACT)

    # Sketch (on Face50 of Pocket017) → Pocket (cut)
    with BuildSketch(Plane.YZ.offset(22.5)):
        Circle(SKETCH_R)
    extrude(amount=-POCKET_DEPTH, mode=Mode.SUBTRACT)

    # Sketch031 (on Face6 of Pocket017) → Pocket018 (cut)
    with BuildSketch(Plane(origin=(-21.5, 0, 0), x_dir=(0, 1, 0), z_dir=(-1, 0, 0))):
        Circle(SKETCH031_R)
    extrude(amount=-POCKET018_DEPTH, mode=Mode.SUBTRACT)

    # Sketch069 (on Face52 of Pocket018) → Pocket040 (cut)
    with BuildSketch(Plane(origin=(-2.5, 0, 0), x_dir=(0, 1, 0), z_dir=(-1, 0, 0))):
        with Locations((-7.071068, 0)):
            Circle(SKETCH069_R)
        with Locations((0, 7.071068)):
            Circle(SKETCH069_R)
        with Locations((7.071068, 0)):
            Circle(SKETCH069_R)
        with Locations((0, -7.071068)):
            Circle(SKETCH069_R)
    extrude(amount=-POCKET040_DEPTH, mode=Mode.SUBTRACT)

    # Sketch035 (on Face50 of Pocket040) → Pocket020 (cut)
    with BuildSketch(Plane.YZ.offset(21.5)):
        Circle(SKETCH035_R)
    extrude(amount=-POCKET020_DEPTH, mode=Mode.SUBTRACT)

    # Cone → Cone (revolve, cut)
    with BuildSketch(Plane(origin=(8.5, 0, 0), x_dir=(0, 1, 0), z_dir=(0, 0, -1))):
        Polygon((0, 0), (11, 0), (20.5, 13), (0, 13), align=None)
    revolve(axis=Axis((8.5, 0, 0), (1, 0, 0)), mode=Mode.SUBTRACT)

    # Cone001 → Cone001 (revolve, cut)
    with BuildSketch(Plane(origin=(-2.5, 0, 0), x_dir=(0, 1, 0), z_dir=(0, 0, 1))):
        Polygon((0, 0), (11, 0), (20.5, 19), (0, 19), align=None)
    revolve(axis=Axis((-2.5, 0, 0), (-1, 0, 0)), mode=Mode.SUBTRACT)


with BuildPart() as part_1:
    # Body006 placement: moved
    add(part.part.moved(Location((7.1, 0, 0))))


solid = part_1.part
